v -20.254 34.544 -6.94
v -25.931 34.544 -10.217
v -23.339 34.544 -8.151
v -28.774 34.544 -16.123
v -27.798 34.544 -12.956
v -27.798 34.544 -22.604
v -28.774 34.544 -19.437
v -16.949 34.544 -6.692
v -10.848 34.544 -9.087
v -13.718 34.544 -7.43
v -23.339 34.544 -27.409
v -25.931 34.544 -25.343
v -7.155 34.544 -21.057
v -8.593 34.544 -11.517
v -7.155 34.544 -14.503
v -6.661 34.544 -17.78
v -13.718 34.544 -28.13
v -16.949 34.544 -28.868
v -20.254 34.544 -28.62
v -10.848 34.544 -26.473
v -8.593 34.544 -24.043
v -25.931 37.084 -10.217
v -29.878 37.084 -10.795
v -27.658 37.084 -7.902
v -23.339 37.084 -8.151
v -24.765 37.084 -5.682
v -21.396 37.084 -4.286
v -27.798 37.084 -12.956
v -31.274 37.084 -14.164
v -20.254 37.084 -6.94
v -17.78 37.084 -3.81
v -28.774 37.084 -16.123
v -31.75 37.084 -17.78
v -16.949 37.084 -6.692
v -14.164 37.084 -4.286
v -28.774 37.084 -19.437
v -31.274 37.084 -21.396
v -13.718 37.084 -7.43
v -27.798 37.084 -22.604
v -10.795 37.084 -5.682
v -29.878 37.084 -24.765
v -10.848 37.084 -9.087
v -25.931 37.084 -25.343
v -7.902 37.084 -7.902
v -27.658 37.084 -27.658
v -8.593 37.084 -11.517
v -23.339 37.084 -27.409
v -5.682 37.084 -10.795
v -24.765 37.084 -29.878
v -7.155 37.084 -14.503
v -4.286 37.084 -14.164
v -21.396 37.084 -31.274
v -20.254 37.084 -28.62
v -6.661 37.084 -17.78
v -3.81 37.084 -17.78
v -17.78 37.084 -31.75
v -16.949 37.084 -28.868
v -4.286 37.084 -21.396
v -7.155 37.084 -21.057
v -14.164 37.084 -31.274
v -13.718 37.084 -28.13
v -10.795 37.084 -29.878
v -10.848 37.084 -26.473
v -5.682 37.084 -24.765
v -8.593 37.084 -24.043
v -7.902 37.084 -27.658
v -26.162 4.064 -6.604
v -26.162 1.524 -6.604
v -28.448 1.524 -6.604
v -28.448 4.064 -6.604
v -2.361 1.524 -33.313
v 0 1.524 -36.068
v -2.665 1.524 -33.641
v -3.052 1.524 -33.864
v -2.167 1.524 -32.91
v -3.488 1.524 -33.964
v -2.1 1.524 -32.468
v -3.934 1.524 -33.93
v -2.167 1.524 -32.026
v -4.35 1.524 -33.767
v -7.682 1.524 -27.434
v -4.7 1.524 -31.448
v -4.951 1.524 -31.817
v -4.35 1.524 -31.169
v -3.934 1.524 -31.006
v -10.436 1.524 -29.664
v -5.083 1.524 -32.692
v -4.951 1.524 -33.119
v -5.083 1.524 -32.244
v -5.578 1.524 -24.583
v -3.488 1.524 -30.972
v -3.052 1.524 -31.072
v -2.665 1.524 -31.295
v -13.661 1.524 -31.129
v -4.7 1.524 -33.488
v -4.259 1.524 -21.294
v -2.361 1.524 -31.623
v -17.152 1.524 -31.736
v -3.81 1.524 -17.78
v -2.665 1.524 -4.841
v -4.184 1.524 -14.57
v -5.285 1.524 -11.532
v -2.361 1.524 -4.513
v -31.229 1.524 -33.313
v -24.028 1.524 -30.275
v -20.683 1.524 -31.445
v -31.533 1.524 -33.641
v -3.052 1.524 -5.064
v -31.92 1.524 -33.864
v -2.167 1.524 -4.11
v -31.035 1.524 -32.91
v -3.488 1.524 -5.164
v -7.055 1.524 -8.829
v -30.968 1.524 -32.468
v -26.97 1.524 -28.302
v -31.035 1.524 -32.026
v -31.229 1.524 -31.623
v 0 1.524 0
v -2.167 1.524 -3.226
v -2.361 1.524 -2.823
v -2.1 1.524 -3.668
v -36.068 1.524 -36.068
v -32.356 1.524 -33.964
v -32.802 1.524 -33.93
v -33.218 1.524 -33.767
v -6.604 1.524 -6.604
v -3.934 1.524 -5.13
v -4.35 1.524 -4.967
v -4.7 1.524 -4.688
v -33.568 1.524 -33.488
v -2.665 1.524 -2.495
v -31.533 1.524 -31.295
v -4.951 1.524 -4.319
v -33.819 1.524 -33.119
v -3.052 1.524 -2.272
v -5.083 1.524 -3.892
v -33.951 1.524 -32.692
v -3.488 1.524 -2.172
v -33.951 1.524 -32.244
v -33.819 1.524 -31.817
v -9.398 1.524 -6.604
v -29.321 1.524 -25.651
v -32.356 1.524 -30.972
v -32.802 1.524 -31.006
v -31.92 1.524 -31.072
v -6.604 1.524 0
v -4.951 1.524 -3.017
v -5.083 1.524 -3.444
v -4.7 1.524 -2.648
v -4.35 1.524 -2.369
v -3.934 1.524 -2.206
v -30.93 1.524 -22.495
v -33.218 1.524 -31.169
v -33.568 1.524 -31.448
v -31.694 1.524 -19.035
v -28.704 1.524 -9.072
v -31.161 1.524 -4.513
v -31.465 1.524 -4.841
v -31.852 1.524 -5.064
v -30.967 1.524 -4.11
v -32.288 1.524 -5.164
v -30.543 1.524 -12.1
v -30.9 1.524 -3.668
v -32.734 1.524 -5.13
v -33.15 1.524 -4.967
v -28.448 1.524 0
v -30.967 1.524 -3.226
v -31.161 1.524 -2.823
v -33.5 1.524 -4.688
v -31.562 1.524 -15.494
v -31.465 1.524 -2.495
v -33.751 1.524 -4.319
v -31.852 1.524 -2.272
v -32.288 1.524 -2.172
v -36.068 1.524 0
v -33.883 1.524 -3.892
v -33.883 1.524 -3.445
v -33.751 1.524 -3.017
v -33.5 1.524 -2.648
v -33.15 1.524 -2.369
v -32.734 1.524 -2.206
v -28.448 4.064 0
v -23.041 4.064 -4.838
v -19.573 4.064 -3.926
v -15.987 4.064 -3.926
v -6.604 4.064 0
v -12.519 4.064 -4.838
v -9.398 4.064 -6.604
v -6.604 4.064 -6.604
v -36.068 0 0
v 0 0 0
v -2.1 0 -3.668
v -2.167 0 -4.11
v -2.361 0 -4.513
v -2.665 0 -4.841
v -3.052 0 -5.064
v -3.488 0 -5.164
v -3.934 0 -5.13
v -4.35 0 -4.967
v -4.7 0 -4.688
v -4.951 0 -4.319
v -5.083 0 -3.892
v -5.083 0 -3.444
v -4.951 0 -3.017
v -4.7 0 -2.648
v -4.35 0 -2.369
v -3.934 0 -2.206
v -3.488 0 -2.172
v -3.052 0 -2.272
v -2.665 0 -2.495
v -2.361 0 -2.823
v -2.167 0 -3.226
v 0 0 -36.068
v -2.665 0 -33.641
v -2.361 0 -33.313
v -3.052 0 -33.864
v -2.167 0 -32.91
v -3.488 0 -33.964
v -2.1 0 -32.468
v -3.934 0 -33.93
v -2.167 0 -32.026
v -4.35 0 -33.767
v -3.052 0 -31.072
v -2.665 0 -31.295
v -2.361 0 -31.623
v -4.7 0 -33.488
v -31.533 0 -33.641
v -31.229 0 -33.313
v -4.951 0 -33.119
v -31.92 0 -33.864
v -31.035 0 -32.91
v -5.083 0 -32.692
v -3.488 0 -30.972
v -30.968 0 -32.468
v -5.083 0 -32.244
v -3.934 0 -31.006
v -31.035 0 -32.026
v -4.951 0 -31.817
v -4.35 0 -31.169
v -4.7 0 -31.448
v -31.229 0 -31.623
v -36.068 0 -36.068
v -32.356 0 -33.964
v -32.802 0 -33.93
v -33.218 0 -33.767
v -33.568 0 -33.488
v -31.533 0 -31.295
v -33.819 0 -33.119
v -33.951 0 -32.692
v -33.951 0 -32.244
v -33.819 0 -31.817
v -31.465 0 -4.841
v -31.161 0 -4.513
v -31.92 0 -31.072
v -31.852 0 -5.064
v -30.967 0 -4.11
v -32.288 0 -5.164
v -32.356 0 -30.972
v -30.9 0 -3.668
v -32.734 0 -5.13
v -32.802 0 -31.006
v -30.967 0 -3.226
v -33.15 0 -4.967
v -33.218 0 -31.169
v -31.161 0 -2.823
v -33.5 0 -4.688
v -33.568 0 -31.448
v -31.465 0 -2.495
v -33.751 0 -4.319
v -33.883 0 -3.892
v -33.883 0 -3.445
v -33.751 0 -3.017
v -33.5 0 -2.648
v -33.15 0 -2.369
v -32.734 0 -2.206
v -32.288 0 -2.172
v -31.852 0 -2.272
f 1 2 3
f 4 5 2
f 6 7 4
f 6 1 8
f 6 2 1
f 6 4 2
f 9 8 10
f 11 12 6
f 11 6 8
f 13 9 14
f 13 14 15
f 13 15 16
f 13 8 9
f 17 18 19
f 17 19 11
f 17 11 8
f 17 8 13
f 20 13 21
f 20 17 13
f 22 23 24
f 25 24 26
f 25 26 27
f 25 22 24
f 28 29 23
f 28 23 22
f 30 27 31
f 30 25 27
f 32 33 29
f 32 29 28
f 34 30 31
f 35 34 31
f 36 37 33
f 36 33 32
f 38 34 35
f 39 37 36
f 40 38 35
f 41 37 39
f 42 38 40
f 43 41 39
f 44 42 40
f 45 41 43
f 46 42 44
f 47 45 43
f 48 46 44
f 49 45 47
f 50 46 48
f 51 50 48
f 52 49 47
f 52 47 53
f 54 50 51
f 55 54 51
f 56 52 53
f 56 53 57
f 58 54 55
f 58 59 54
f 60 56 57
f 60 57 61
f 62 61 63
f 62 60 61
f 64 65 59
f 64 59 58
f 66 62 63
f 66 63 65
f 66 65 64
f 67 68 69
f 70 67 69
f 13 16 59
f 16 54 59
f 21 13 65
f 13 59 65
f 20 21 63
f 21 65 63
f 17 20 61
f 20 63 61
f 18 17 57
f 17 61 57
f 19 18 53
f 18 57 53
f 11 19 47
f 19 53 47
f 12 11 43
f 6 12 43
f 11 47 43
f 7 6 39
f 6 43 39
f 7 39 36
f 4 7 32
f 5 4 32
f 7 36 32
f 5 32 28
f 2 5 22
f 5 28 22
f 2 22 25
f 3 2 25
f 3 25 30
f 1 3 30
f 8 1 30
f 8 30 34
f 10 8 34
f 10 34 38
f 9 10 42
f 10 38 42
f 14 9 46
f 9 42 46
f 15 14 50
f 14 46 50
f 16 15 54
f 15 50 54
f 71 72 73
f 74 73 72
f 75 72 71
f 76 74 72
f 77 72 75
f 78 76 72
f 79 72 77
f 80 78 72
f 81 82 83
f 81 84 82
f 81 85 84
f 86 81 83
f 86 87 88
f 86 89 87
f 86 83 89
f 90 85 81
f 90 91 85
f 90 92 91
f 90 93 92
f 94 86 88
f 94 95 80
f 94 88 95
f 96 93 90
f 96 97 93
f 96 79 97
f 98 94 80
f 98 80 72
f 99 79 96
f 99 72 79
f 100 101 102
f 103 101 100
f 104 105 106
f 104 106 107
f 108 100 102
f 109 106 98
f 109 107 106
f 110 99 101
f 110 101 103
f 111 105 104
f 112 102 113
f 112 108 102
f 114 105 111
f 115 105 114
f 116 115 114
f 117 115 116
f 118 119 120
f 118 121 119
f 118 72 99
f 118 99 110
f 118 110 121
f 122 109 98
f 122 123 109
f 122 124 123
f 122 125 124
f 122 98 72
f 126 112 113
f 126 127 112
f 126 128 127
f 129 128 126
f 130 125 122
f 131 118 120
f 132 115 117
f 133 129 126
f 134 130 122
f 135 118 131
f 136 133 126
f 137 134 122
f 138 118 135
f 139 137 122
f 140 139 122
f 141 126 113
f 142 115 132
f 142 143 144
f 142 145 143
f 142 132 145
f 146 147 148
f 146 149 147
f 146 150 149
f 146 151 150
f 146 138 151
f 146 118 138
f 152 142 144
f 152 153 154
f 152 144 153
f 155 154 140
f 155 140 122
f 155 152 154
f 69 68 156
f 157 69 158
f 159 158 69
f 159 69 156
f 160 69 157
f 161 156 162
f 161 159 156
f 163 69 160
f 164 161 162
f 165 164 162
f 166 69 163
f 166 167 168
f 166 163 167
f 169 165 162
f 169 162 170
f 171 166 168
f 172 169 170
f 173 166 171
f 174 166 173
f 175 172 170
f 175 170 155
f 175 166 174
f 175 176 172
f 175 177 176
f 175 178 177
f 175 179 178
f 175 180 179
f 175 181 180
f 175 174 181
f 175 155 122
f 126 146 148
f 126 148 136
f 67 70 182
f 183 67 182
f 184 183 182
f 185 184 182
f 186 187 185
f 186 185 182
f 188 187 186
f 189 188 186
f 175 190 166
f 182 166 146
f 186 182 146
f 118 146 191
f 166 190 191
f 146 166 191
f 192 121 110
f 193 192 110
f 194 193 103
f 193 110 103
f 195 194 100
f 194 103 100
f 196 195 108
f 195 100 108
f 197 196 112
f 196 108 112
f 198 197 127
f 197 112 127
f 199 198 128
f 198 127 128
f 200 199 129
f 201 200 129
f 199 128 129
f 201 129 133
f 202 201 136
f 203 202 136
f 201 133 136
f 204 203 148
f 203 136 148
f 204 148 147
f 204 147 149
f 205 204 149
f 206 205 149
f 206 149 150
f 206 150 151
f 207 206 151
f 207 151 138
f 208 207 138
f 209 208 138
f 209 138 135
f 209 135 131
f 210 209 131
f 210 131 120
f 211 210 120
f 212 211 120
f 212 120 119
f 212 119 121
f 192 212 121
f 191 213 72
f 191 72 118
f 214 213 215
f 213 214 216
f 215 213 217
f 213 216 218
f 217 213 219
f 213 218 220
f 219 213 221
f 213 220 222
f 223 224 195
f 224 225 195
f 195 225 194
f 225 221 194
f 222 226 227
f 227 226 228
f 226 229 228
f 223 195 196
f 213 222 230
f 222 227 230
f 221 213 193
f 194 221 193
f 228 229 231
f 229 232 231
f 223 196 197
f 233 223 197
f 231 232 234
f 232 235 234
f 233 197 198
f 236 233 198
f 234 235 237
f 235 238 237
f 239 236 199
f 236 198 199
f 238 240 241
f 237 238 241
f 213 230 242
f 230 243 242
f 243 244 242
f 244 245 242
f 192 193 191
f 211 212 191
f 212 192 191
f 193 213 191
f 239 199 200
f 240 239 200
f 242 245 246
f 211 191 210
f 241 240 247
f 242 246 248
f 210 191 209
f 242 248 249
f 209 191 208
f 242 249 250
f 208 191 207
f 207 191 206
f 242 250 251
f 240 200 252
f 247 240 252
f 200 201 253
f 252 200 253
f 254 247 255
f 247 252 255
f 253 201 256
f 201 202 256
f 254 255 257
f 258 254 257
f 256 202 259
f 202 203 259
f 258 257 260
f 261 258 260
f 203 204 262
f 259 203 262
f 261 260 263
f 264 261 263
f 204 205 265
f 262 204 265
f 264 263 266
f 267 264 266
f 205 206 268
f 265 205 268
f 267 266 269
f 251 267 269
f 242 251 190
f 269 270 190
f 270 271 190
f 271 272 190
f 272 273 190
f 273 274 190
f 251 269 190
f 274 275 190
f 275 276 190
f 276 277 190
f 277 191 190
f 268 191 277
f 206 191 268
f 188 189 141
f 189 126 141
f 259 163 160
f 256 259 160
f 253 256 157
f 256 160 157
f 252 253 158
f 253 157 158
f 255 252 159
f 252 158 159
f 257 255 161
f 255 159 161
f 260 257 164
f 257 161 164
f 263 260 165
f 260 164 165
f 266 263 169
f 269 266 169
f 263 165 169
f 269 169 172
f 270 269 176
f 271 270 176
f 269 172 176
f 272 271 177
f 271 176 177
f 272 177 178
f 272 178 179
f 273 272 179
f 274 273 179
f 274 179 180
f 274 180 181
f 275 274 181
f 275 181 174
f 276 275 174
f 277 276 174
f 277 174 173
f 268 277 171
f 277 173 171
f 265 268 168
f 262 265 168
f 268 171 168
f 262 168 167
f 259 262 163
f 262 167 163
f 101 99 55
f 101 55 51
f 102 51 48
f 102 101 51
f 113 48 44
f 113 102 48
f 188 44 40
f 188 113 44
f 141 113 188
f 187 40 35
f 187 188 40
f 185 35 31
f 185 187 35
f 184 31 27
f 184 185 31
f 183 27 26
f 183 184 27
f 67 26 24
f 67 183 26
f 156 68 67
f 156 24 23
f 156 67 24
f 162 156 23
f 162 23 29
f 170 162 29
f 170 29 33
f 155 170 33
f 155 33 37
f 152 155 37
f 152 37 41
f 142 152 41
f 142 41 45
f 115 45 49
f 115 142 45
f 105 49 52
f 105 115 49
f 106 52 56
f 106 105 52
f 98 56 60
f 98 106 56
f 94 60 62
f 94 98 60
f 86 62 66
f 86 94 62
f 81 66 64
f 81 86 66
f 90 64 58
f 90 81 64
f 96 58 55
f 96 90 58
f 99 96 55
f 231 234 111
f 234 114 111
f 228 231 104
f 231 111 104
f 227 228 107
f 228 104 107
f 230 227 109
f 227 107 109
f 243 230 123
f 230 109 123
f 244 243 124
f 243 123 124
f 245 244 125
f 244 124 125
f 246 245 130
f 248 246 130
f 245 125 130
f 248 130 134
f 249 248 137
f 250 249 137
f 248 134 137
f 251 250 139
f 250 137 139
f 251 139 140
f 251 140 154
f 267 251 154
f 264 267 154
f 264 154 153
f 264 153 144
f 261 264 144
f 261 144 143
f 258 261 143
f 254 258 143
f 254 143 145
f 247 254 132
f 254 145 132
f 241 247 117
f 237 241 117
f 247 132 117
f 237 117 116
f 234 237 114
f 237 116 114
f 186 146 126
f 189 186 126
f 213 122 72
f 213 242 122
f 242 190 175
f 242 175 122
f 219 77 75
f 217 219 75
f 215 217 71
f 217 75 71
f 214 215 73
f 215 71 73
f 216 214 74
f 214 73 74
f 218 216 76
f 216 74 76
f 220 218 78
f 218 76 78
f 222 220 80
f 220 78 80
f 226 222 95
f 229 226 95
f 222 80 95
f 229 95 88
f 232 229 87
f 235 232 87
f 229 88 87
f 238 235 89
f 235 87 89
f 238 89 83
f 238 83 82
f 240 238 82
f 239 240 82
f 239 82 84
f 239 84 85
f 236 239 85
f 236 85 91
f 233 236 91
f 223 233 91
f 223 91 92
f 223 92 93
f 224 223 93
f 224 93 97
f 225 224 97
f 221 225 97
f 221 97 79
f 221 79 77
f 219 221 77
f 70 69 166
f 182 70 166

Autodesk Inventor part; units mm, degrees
ref_plane "YZ Plane" through (0, 0, 0) normal (1, 0, 0) x (0, 1, 0)
ref_plane "XZ Plane" through (0, 0, 0) normal (0, 1, 0) x (-1, 0, 0)
ref_plane "XY Plane" through (0, 0, 0) normal (0, 0, 1) x (1, 0, 0)
sketch "Sketch1" plane through (0, 0, 0) normal (0, 1, 0) x (-1, 0, 0)
  line L0 (0, 0) -> (36.068, 0)
  line L1 (36.068, 0) -> (36.068, -36.068)
  line L2 (36.068, -36.068) -> (0, -36.068)
  line L3 (0, -36.068) -> (0, 0)
  dimension "d0" = 36.068
  dimension "d1" = 36.068
extrude "Extrusion1" add sketch "Sketch1" along normal blind 1.524
sketch "Sketch2" plane through (0, 1.524, 0) normal (0, 1, 0) x (1, 0, 0)
  circle A0 centre (-17.78, 17.78) radius 13.97
  line L0 (0, 0) -> (0, 36.068) projected
  line L1 (-36.068, 0) -> (0, 0) projected
  dimension "d4" = 27.94
  dimension "d5" = 17.78
  dimension "d6" = 17.78
extrude "Extrusion2" add sketch "Sketch2" along normal blind 35.56
sketch "Sketch4" plane through (0, 1.524, 0) normal (0, 1, 0) x (1, 0, 0)
  line L0 (-28.448, 0) -> (-6.604, 0)
  line L1 (-6.604, 0) -> (-6.604, 6.604)
  line L2 (-6.604, 6.604) -> (-28.448, 6.604)
  line L3 (-28.448, 6.604) -> (-28.448, 0)
  line L4 (-36.068, 36.068) -> (-36.068, 0) projected
  point P0 (0, 0)
  dimension "d9" = 21.844
  dimension "d10" = 6.604
  dimension "d11" = 7.62
extrude "Extrusion3" add sketch "Sketch4" along normal blind 2.54
sketch "Sketch5" plane through (-17.78, 37.084, -17.78) normal (0, 1, 0) x (1, 0, 0)
  circle A0 centre (0, 0) radius 11.1186
  point P0 (17.78, -17.78)
extrude "Extrusion4" cut sketch "Sketch5" against normal blind 2.54
sketch "Sketch6" plane through (0, 1.524, 0) normal (0, 1, 0) x (1, 0, 0)
  circle A0 centre (-32.4, 3.6681) radius 1.5
  circle A1 centre (-32.468, 32.468) radius 1.5
  circle A2 centre (-3.6, 3.668) radius 1.5
  circle A3 centre (-3.6, 32.468) radius 1.5
  line L0 (0, 36.068) -> (-36.068, 36.068) projected
  line L1 (0, 0) -> (0, 36.068) projected
  line L2 (-36.068, 36.068) -> (-36.068, 0) projected
  dimension "d16" = 3
  dimension "d17" = 3
  dimension "d18" = 3
  dimension "d19" = 3
  dimension "d20" = 28.8
  dimension "d21" = 28.8
  dimension "d22" = 3.6
  dimension "d23" = 3.6
  dimension "d24" = 3.6
  dimension "d25" = 3.6
  dimension "d26" = 3.6
extrude "Extrusion5" cut sketch "Sketch6" against normal up to surface (1.524 mm away)
properties part number "camera"
